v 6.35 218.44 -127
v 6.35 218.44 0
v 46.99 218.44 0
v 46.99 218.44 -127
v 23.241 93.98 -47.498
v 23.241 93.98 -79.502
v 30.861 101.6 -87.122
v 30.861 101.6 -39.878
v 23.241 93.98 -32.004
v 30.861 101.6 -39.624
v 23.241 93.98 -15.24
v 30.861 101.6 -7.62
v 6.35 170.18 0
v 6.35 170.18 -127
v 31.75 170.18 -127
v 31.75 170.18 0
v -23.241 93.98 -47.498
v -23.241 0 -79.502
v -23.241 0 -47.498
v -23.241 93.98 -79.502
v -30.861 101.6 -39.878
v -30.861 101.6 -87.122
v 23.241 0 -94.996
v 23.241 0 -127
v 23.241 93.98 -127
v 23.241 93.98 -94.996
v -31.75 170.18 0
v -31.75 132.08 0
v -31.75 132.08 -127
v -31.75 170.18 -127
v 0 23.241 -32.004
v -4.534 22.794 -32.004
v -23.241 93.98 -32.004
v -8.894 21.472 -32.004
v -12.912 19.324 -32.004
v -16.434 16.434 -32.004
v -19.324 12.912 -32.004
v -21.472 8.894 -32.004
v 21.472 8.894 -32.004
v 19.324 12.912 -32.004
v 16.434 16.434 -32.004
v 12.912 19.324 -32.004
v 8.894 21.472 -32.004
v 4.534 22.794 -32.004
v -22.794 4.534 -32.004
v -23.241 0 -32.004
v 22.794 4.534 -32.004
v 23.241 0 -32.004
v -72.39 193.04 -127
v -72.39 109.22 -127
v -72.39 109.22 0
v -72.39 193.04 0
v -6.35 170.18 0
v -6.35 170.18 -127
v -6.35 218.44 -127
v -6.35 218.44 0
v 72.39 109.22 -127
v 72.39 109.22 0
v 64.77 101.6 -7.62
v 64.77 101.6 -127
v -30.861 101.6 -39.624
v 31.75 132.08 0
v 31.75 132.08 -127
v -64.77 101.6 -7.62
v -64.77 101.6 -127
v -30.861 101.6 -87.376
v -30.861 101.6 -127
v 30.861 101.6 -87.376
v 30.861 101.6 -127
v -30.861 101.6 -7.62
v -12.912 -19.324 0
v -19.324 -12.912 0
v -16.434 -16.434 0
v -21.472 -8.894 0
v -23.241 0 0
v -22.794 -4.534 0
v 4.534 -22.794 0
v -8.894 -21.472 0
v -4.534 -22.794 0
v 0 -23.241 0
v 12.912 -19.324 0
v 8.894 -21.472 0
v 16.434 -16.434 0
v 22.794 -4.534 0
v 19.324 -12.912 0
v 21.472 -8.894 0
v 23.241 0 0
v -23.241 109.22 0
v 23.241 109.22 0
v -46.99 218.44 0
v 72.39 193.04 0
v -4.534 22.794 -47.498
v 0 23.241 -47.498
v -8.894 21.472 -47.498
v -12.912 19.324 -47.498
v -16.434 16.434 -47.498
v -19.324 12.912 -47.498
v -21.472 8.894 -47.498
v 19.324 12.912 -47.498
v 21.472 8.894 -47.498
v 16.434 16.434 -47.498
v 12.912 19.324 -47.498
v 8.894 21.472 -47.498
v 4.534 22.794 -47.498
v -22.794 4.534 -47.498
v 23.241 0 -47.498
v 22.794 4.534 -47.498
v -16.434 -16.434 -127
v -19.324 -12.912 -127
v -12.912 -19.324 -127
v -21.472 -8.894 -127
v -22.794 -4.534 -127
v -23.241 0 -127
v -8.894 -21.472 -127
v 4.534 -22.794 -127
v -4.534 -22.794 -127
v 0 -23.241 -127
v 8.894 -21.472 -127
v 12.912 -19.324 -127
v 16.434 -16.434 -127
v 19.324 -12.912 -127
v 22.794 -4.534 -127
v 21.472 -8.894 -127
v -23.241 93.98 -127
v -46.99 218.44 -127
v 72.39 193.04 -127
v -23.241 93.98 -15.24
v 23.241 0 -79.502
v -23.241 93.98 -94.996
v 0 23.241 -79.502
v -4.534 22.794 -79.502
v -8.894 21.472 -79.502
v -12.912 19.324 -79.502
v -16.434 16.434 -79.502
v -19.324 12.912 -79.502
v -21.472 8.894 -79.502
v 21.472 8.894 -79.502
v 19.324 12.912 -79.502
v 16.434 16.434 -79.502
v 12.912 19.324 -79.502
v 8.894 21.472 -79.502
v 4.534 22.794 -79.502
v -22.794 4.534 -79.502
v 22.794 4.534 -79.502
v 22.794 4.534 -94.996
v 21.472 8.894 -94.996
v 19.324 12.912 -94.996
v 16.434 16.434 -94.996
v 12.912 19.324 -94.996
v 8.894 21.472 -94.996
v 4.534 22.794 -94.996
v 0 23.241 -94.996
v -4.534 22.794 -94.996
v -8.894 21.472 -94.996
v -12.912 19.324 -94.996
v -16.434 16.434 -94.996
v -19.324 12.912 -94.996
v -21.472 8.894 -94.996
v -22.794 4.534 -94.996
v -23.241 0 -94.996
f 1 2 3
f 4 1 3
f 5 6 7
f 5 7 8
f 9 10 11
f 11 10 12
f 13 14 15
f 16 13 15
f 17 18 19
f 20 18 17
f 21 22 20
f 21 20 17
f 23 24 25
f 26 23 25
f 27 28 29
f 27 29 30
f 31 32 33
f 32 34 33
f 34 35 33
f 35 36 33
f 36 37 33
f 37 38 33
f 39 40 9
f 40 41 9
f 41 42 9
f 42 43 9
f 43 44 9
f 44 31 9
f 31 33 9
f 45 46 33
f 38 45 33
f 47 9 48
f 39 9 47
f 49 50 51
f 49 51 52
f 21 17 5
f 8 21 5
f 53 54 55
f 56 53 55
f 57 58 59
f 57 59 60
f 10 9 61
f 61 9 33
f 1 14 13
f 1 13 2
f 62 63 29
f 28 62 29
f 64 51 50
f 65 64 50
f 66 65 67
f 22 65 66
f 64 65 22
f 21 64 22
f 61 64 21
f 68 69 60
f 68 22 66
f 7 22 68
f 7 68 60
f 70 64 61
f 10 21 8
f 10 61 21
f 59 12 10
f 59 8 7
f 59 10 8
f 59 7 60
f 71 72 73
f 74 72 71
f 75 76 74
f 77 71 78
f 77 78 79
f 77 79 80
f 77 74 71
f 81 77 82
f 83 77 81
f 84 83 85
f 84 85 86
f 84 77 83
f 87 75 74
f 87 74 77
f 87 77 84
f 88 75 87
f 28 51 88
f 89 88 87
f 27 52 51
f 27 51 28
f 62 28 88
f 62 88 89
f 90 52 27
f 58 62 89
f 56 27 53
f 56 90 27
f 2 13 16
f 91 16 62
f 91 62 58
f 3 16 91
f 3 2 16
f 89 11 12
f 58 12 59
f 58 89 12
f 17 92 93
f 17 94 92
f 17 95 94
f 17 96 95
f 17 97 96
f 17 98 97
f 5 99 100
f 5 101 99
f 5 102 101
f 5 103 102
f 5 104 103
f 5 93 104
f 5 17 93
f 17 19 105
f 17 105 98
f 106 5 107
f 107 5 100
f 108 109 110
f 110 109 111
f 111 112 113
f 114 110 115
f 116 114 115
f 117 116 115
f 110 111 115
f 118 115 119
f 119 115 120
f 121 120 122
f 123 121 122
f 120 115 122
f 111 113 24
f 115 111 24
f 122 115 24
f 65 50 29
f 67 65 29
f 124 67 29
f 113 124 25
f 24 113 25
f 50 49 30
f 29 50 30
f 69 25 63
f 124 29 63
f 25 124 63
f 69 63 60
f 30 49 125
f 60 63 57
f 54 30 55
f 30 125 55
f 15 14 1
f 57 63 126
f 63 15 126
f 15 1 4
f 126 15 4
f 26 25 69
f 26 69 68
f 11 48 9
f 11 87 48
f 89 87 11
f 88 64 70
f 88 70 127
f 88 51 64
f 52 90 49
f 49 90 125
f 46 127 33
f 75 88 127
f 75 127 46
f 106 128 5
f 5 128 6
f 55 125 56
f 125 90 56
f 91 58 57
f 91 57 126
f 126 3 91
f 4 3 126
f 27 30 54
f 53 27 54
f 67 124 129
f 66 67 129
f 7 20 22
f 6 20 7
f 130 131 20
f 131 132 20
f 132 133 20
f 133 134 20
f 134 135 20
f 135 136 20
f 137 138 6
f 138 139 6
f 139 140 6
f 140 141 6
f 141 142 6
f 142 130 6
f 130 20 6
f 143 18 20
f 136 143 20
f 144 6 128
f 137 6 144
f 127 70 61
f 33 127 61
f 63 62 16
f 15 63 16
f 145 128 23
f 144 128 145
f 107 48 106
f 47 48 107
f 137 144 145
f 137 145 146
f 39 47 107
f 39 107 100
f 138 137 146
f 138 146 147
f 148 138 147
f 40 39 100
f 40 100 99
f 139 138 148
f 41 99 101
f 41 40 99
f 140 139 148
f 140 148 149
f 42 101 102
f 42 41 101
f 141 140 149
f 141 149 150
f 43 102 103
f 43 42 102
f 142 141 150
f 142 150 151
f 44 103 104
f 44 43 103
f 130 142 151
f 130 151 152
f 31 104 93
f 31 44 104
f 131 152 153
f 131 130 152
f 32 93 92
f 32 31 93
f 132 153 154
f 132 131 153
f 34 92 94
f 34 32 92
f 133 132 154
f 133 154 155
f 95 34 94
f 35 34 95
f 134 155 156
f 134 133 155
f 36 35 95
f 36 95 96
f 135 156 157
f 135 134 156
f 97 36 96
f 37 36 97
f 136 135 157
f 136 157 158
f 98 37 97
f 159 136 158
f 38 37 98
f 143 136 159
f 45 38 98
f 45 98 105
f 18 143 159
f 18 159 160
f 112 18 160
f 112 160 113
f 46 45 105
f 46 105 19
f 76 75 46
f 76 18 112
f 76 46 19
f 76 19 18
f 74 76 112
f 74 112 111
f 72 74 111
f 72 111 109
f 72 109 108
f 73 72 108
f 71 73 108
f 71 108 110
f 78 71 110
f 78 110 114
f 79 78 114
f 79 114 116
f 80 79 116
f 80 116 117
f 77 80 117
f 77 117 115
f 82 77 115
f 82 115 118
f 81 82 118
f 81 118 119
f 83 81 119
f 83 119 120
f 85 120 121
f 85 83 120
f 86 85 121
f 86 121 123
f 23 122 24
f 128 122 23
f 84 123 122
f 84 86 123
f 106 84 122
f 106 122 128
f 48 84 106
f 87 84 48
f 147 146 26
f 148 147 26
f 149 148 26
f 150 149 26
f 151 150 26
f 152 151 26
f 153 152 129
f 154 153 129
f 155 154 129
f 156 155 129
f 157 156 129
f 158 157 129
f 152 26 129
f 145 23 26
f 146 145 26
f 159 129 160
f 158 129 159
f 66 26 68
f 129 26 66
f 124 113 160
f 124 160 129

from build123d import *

# Parameters (mm, degrees)
SKETCH1_R                = 23.241
FTA_DEPTH                = 127
SKETCH2_W                = 46.482
SKETCH2_H                = 101.6
FTB_DEPTH                = 32.004
FTC_DEPTH                = 127
SKETCH4_W                = 40.64
SKETCH4_H                = 38.1
FTD1_DEPTH               = 127
SKETCH4_5_W              = 40.64
SKETCH4_5_H              = 38.1
FTD2_DEPTH               = 127
SKETCH5_W                = 25.4
SKETCH5_H                = 48.26
FTE_DEPTH                = 127
FTE_2_DEPTH              = 127
SKETCH6_W                = 40.64
SKETCH6_H                = 48.26
SKETCH6_H_2              = 30.48
FILLER_DEPTH             = 127
BOSS_EXTRUDE1_DEPTH      = 16.002
BOSS_EXTRUDE1_DEPTH_BACK = 16.002
SKETCH8_W                = 46.482
SKETCH8_H                = 101.6
CHAMFER1_SIZE            = 7.62
BOSS_EXTRUDE2_DEPTH      = 32.004
CHAMFER2_SIZE            = 25.4
CHAMFER3_SIZE            = 7.62


with BuildPart() as part:
    # Sketch1 → ftA (new body)
    with BuildSketch(Plane.XY):
        Circle(SKETCH1_R)
    extrude(amount=-FTA_DEPTH)


with BuildPart() as body_2:
    # Sketch2 → ftB (new body)
    with BuildSketch(Plane(origin=(0, 0, -127), x_dir=(-1, 0, 0), z_dir=(0, 0, -1))):
        with Locations((0, 50.8)):
            Rectangle(SKETCH2_W, SKETCH2_H)
    extrude(amount=-FTB_DEPTH)

    # Sketch3 → ftC (add)
    with BuildSketch(Plane(origin=(0, 0, -127), x_dir=(-1, 0, 0), z_dir=(0, 0, -1))):
        Polygon((-23.241, 101.6), (-31.75, 101.6), (-31.75, 132.08), (31.75, 132.08), (31.75, 101.6), (23.241, 101.6), align=None)
    extrude(amount=-FTC_DEPTH)



with BuildPart() as body_3:
    # Sketch4 → ftD1 (new body)
    with BuildSketch(Plane.XY):
        with Locations((52.07, 151.13)):
            Rectangle(SKETCH4_W, SKETCH4_H)
    extrude(amount=-FTD1_DEPTH)

    # Sketch4<5> → ftD2 (add)
    with BuildSketch(Plane.XY):
        with Locations((-52.07, 151.13)):
            Rectangle(SKETCH4_5_W, SKETCH4_5_H)
        with Locations((52.07, 151.13)):
            Rectangle(SKETCH4_5_W, SKETCH4_5_H)
    extrude(amount=-FTD2_DEPTH)


with BuildPart() as ftd2_piece_1:
    # of the separate pieces the step leaves, piece 1, a body of its own (ftd2_pieces)
    add(body_3.part.solids().sort_by_distance((31.75, 132.08, 0))[0])


with BuildPart() as ftd2_piece_2:
    # of the separate pieces the step leaves, piece 2, a body of its own (ftd2_pieces)
    add(body_3.part.solids().sort_by_distance((-31.75, 132.08, 0))[0])


with BuildPart() as body_5:
    # Sketch5 → ftE (new body)
    with BuildSketch(Plane.XY):
        with Locations((-19.05, 194.31)):
            Rectangle(SKETCH5_W, SKETCH5_H)
    extrude(amount=-FTE_DEPTH)


with BuildPart() as body_6:
    # Sketch5 → ftE 2 (new body)
    with BuildSketch(Plane.XY):
        with Locations((19.05, 194.31)):
            Rectangle(SKETCH5_W, SKETCH5_H)
    extrude(amount=-FTE_2_DEPTH)


with BuildPart() as body_2_1:
    add(body_2.part)

    add(ftd2_piece_1.part)  # Filler merges ftD2 piece 1

    add(ftd2_piece_2.part)  # Filler merges ftD2 piece 2

    add(body_5.part)  # Filler merges body 5

    add(body_6.part)  # Filler merges body 6
    # Sketch6 → Filler (add)
    with BuildSketch(Plane.XY):
        with Locations((52.07, 194.31)):
            Rectangle(SKETCH6_W, SKETCH6_H)
        with Locations((-52.07, 194.31)):
            Rectangle(SKETCH6_W, SKETCH6_H)
        with Locations((-52.07, 116.84)):
            Rectangle(SKETCH6_W, SKETCH6_H_2)
        with Locations((52.07, 116.84)):
            Rectangle(SKETCH6_W, SKETCH6_H_2)
    extrude(amount=-FILLER_DEPTH)

    # Combine3: union part
    add(part.part)

    # Sketch8 → Boss-Extrude1 (add, two sides: drawn at the far end of the back side and taken through both)
    with BuildSketch(Plane.XY.offset(-63.5).offset(-BOSS_EXTRUDE1_DEPTH_BACK)):
        with Locations((0, 50.8)):
            Rectangle(SKETCH8_W, SKETCH8_H)
    extrude(amount=BOSS_EXTRUDE1_DEPTH + BOSS_EXTRUDE1_DEPTH_BACK)

    # Chamfer1
    chamfer1_edges = [body_2_1.edges().sort_by_distance(p)[0] for p in [
        (72.39, 101.6, -63.5),
        (0, 101.6, -94.996),
        (-23.241, 101.6, -63.5),
        (0, 101.6, -79.502),
        (23.241, 101.6, -63.5),
        (0, 101.6, -47.498),
        (0, 101.6, 0),
        (-72.39, 101.6, -63.5),
        (23.241, 101.6, -110.998),
        (-23.241, 101.6, -110.998),
    ]]
    chamfer(chamfer1_edges, length=CHAMFER1_SIZE)

    # Sketch9 → Boss-Extrude2 (add)
    with BuildSketch(Plane.XY):
        Polygon((-23.241, 0), (23.241, 0), (23.241, 101.6), (23.241, 109.22), (-23.241, 109.22), (-23.241, 101.6), align=None)
    extrude(amount=-BOSS_EXTRUDE2_DEPTH)

    # Chamfer2
    chamfer2_edges = [body_2_1.edges().sort_by_distance(p)[0] for p in [
        (72.39, 218.44, -63.5),
        (-72.39, 218.44, -63.5),
    ]]
    chamfer(chamfer2_edges, length=CHAMFER2_SIZE)

    # Chamfer3
    chamfer3_edges = [body_2_1.edges().sort_by_distance(p)[0] for p in [
        (0, 101.6, -32.004),
        (-23.241, 101.6, -19.812),
        (23.241, 101.6, -19.812),
    ]]
    chamfer(chamfer3_edges, length=CHAMFER3_SIZE)


solid = body_2_1.part
